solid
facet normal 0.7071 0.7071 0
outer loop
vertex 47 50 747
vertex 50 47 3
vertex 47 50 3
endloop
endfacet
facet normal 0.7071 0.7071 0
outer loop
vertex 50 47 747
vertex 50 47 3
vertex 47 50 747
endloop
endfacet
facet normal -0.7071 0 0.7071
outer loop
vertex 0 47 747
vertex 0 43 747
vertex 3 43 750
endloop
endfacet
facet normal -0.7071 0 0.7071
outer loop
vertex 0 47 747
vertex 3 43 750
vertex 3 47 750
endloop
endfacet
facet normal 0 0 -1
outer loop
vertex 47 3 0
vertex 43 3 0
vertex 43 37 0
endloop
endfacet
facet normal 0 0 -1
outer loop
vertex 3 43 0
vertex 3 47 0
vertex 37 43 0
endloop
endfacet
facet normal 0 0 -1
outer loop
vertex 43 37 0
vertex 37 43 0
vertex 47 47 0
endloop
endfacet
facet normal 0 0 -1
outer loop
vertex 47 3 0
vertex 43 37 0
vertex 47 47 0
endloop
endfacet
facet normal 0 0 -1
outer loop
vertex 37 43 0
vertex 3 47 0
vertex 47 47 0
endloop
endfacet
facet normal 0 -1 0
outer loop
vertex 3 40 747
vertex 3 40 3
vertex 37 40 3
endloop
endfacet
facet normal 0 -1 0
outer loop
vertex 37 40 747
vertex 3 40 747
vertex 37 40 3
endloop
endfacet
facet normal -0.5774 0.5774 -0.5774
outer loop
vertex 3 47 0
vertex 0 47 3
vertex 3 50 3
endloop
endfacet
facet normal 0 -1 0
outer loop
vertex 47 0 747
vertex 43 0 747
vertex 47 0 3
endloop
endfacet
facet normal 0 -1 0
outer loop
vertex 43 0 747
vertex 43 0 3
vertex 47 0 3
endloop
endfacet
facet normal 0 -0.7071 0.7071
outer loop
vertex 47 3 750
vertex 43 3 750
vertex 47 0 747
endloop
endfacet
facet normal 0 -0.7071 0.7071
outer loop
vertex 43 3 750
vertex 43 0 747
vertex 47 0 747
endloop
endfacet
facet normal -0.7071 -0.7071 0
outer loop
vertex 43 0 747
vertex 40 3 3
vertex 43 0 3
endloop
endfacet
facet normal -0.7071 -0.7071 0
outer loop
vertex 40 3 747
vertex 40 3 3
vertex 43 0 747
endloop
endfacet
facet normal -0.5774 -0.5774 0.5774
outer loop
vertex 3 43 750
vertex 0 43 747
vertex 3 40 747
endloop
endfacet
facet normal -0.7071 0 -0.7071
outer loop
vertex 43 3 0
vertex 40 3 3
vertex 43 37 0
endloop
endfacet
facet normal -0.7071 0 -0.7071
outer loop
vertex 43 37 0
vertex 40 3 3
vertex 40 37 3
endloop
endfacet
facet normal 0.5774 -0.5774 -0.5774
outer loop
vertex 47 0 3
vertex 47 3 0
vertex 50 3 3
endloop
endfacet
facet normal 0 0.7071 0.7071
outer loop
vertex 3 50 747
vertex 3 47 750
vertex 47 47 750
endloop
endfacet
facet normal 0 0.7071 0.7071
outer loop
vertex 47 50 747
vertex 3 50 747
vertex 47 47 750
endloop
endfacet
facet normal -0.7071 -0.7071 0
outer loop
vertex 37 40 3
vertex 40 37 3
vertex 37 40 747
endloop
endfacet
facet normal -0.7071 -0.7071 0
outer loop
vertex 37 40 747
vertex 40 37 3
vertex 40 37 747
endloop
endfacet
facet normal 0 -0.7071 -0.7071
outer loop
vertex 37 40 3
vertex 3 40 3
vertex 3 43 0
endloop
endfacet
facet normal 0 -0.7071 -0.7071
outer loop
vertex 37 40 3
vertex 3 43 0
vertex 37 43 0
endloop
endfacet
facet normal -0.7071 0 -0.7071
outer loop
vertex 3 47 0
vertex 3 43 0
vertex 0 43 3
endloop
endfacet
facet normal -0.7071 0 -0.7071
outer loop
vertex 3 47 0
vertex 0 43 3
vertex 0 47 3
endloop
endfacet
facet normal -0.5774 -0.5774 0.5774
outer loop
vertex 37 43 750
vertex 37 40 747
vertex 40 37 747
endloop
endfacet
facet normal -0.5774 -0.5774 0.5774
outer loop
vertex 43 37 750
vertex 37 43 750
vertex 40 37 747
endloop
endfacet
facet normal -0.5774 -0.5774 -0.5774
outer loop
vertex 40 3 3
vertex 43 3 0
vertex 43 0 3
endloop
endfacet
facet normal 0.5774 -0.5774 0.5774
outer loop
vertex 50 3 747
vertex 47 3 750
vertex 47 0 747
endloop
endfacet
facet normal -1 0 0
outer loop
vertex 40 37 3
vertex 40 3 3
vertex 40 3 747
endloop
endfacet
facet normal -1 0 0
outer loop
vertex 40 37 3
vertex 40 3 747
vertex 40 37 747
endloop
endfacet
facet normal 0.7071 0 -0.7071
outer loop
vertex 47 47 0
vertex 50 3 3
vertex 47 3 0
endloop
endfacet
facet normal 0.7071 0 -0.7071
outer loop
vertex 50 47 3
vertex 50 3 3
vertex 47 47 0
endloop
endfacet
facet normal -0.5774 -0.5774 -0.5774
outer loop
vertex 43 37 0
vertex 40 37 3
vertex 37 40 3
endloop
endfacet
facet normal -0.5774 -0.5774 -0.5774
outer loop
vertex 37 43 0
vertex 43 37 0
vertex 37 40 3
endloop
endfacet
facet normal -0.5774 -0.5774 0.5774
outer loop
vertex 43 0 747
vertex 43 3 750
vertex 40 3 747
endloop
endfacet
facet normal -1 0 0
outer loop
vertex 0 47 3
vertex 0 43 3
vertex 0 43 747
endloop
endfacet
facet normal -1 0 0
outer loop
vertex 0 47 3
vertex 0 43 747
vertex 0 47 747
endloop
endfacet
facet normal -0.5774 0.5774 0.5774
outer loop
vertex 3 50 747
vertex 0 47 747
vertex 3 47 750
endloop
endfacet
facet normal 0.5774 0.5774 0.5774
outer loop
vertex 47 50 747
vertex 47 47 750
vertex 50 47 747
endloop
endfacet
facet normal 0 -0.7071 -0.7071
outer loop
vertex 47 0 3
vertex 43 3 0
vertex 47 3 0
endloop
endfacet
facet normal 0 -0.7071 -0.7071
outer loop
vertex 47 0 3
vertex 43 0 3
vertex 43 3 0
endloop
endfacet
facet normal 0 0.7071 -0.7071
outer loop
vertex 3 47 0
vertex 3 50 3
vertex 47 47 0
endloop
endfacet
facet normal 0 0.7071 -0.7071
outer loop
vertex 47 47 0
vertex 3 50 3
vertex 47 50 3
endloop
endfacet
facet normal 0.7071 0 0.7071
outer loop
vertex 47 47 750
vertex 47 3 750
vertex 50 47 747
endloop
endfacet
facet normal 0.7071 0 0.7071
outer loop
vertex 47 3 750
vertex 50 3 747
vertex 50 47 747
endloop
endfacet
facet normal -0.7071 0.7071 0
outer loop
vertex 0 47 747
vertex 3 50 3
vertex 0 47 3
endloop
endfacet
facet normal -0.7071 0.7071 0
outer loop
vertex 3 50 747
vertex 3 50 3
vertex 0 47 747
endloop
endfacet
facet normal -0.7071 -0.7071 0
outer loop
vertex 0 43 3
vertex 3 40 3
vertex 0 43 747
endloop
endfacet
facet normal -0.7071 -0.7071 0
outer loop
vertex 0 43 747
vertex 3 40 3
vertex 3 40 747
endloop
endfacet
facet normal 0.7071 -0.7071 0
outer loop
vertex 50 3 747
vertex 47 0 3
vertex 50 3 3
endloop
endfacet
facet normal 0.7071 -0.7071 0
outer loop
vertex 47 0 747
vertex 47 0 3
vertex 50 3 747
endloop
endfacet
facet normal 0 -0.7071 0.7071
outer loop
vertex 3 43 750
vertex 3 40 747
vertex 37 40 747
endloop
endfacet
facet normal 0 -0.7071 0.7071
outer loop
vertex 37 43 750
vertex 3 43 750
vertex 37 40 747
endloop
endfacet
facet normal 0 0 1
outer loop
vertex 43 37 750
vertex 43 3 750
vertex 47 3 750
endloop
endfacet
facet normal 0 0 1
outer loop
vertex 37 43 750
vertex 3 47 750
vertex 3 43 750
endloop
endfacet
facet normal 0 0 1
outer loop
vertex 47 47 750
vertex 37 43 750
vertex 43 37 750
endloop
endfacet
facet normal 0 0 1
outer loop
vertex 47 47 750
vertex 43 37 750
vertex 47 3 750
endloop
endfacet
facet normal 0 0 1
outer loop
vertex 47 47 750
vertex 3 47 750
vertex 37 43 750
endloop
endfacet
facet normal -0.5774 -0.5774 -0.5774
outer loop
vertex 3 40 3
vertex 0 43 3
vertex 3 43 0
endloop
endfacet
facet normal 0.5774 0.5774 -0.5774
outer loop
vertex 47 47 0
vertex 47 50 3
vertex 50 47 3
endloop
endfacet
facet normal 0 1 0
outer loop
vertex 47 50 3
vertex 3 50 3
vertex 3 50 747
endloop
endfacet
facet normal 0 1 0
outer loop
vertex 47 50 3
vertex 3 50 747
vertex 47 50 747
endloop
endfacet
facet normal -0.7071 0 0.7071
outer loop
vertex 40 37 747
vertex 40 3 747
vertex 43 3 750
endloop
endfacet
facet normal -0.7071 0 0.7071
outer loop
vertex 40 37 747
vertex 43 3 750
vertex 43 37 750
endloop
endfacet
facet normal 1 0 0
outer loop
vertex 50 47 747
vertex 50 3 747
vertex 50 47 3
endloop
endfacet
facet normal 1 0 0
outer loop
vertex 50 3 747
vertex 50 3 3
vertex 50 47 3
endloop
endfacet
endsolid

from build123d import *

# Parameters (mm, degrees)
BOX001_W     = 40
BOX001_H     = 40
BOX001_DEPTH = 750
BOX_W        = 50
BOX_H        = 50
BOX_DEPTH    = 750
CHAMFER_SIZE = 3


with BuildPart() as cube001:
    # Box001 → Box001 (new body)
    with BuildSketch(Plane.XY):
        with Locations((20, 20)):
            Rectangle(BOX001_W, BOX001_H)
    extrude(amount=BOX001_DEPTH)


with BuildPart() as chamfer_body:
    # Box → Box (new body)
    with BuildSketch(Plane.XY):
        with Locations((25, 25)):
            Rectangle(BOX_W, BOX_H)
    extrude(amount=BOX_DEPTH)

    # Cut: cut Cube001
    add(cube001.part, mode=Mode.SUBTRACT)

    # Chamfer
    chamfer_edges = [chamfer_body.edges().sort_by_distance(p)[0] for p in [
        (0, 40, 375),
        (0, 45, 750),
        (0, 50, 375),
        (0, 45, 0),
        (20, 40, 0),
        (40, 40, 375),
        (20, 40, 750),
        (25, 50, 750),
        (50, 25, 750),
        (45, 0, 750),
        (40, 20, 750),
        (25, 50, 0),
        (50, 50, 375),
        (50, 25, 0),
        (45, 0, 0),
        (40, 20, 0),
        (40, 0, 375),
        (50, 0, 375),
    ]]
    chamfer(chamfer_edges, length=CHAMFER_SIZE)


solid = chamfer_body.part
